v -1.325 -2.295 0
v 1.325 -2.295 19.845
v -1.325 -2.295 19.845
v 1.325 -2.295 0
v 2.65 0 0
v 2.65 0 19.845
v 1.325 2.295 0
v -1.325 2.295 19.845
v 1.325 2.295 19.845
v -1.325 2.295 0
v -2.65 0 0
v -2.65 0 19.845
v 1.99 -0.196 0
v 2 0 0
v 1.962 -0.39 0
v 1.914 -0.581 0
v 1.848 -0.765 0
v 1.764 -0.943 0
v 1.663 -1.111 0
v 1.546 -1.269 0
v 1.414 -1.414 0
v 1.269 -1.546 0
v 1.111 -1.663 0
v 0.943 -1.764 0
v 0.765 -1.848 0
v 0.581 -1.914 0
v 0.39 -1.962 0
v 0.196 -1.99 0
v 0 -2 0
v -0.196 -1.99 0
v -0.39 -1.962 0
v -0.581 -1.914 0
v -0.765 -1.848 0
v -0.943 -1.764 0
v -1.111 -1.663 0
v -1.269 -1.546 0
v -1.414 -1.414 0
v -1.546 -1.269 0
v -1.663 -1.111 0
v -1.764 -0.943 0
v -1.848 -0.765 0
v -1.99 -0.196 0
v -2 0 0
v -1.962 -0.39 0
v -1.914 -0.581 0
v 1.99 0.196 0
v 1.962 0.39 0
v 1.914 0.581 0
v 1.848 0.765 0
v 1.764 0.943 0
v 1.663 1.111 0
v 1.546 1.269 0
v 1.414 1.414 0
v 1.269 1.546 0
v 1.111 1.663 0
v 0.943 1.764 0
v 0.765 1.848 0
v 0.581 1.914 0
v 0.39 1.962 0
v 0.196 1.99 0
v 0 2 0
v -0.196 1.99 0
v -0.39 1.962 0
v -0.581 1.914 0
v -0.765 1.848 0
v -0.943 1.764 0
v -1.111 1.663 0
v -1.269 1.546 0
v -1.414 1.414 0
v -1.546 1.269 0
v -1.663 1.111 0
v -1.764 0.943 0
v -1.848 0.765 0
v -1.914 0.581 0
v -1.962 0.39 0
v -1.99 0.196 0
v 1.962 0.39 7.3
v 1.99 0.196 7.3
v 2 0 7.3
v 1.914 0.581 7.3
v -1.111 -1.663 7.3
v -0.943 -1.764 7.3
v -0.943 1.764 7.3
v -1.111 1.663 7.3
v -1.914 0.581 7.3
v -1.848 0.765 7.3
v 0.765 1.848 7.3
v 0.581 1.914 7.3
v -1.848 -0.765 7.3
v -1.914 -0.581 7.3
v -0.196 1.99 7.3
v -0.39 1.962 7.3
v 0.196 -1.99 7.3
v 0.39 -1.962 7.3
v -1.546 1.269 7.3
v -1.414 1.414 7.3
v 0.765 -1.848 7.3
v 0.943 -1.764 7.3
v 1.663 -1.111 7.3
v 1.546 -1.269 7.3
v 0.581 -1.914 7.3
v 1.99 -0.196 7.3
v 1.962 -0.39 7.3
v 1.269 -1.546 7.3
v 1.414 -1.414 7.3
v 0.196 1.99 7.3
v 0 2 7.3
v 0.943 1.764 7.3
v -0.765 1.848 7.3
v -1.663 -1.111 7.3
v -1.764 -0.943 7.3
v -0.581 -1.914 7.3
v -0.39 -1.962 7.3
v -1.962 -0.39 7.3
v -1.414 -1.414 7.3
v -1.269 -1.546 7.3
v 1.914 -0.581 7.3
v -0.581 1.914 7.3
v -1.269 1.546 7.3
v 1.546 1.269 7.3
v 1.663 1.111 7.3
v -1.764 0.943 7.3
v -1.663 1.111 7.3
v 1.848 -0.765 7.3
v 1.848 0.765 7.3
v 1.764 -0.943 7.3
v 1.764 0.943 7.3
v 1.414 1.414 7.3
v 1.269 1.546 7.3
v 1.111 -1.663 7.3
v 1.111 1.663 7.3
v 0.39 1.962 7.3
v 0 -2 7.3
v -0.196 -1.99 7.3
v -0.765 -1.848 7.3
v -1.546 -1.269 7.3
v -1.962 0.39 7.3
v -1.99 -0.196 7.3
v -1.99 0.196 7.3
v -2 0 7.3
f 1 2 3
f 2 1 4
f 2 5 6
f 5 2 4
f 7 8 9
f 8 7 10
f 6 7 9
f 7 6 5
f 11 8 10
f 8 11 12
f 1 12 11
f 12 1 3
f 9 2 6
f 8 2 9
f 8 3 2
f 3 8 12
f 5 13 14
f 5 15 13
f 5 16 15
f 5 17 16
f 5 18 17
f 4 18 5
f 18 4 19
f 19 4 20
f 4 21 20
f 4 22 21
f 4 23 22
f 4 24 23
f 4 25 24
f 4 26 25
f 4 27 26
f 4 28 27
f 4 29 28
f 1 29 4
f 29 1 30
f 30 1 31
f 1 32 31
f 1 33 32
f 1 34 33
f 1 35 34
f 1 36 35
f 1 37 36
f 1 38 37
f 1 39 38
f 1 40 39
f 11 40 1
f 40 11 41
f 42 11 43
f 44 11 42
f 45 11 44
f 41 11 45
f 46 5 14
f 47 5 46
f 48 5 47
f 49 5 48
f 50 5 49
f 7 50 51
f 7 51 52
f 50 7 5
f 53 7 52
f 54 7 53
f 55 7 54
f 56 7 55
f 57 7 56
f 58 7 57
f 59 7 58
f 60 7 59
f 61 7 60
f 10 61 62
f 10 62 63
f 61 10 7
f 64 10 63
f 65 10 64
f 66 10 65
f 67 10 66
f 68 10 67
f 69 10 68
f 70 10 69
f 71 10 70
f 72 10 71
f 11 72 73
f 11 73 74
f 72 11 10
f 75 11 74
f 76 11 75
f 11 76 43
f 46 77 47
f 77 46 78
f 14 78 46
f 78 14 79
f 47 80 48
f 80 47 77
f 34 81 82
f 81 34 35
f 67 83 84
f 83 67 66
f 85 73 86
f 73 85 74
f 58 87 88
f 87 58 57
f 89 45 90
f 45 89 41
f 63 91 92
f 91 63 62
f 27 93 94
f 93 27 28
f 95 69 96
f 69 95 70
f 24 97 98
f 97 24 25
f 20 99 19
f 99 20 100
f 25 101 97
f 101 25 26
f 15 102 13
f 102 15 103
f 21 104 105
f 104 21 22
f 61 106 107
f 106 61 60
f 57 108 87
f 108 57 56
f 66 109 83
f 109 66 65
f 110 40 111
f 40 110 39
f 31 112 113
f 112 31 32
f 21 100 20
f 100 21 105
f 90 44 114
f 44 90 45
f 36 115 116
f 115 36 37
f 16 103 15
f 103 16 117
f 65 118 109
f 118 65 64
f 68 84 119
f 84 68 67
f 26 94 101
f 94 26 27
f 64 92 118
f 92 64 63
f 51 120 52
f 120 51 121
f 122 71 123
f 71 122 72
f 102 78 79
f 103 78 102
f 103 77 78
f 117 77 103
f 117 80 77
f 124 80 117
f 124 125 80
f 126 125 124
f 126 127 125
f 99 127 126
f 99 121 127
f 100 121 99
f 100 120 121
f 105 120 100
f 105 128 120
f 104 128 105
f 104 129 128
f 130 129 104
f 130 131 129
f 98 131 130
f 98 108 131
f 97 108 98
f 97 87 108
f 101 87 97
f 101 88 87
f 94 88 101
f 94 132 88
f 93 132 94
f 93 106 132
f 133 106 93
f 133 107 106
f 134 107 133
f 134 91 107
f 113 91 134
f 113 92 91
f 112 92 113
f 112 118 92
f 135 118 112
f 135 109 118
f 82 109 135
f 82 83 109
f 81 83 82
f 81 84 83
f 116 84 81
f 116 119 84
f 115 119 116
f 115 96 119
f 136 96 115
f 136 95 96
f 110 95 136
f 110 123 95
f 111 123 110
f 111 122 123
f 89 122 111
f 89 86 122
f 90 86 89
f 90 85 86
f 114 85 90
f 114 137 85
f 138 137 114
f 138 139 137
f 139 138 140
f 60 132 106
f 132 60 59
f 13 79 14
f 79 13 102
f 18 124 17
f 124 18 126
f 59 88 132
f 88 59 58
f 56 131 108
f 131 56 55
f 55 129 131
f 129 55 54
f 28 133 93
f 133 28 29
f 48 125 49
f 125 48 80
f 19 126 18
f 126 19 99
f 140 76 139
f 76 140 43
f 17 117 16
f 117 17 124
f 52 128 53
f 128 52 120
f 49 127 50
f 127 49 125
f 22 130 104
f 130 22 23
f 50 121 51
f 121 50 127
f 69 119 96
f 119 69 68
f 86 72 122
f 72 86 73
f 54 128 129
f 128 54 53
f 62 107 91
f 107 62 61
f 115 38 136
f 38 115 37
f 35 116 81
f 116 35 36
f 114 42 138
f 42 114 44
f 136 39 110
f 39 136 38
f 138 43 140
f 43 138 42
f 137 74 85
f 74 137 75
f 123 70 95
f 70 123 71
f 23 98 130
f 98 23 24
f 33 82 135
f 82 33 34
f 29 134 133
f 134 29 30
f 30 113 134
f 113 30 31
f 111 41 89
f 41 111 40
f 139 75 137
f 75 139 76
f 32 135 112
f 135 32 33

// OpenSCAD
module hex_nut() {
    difference() {
        // Hexagonal prism for the nut
        scale([5.3/2, 5.3/2, 6.3/2])
            cylinder(h=6.3, r=1, $fn=6);
        
        // Cylindrical hole for the screw
        translate([0, 0, -1])
            cylinder(h=8.3, r=2, $fn=64);
    }
}

hex_nut();
